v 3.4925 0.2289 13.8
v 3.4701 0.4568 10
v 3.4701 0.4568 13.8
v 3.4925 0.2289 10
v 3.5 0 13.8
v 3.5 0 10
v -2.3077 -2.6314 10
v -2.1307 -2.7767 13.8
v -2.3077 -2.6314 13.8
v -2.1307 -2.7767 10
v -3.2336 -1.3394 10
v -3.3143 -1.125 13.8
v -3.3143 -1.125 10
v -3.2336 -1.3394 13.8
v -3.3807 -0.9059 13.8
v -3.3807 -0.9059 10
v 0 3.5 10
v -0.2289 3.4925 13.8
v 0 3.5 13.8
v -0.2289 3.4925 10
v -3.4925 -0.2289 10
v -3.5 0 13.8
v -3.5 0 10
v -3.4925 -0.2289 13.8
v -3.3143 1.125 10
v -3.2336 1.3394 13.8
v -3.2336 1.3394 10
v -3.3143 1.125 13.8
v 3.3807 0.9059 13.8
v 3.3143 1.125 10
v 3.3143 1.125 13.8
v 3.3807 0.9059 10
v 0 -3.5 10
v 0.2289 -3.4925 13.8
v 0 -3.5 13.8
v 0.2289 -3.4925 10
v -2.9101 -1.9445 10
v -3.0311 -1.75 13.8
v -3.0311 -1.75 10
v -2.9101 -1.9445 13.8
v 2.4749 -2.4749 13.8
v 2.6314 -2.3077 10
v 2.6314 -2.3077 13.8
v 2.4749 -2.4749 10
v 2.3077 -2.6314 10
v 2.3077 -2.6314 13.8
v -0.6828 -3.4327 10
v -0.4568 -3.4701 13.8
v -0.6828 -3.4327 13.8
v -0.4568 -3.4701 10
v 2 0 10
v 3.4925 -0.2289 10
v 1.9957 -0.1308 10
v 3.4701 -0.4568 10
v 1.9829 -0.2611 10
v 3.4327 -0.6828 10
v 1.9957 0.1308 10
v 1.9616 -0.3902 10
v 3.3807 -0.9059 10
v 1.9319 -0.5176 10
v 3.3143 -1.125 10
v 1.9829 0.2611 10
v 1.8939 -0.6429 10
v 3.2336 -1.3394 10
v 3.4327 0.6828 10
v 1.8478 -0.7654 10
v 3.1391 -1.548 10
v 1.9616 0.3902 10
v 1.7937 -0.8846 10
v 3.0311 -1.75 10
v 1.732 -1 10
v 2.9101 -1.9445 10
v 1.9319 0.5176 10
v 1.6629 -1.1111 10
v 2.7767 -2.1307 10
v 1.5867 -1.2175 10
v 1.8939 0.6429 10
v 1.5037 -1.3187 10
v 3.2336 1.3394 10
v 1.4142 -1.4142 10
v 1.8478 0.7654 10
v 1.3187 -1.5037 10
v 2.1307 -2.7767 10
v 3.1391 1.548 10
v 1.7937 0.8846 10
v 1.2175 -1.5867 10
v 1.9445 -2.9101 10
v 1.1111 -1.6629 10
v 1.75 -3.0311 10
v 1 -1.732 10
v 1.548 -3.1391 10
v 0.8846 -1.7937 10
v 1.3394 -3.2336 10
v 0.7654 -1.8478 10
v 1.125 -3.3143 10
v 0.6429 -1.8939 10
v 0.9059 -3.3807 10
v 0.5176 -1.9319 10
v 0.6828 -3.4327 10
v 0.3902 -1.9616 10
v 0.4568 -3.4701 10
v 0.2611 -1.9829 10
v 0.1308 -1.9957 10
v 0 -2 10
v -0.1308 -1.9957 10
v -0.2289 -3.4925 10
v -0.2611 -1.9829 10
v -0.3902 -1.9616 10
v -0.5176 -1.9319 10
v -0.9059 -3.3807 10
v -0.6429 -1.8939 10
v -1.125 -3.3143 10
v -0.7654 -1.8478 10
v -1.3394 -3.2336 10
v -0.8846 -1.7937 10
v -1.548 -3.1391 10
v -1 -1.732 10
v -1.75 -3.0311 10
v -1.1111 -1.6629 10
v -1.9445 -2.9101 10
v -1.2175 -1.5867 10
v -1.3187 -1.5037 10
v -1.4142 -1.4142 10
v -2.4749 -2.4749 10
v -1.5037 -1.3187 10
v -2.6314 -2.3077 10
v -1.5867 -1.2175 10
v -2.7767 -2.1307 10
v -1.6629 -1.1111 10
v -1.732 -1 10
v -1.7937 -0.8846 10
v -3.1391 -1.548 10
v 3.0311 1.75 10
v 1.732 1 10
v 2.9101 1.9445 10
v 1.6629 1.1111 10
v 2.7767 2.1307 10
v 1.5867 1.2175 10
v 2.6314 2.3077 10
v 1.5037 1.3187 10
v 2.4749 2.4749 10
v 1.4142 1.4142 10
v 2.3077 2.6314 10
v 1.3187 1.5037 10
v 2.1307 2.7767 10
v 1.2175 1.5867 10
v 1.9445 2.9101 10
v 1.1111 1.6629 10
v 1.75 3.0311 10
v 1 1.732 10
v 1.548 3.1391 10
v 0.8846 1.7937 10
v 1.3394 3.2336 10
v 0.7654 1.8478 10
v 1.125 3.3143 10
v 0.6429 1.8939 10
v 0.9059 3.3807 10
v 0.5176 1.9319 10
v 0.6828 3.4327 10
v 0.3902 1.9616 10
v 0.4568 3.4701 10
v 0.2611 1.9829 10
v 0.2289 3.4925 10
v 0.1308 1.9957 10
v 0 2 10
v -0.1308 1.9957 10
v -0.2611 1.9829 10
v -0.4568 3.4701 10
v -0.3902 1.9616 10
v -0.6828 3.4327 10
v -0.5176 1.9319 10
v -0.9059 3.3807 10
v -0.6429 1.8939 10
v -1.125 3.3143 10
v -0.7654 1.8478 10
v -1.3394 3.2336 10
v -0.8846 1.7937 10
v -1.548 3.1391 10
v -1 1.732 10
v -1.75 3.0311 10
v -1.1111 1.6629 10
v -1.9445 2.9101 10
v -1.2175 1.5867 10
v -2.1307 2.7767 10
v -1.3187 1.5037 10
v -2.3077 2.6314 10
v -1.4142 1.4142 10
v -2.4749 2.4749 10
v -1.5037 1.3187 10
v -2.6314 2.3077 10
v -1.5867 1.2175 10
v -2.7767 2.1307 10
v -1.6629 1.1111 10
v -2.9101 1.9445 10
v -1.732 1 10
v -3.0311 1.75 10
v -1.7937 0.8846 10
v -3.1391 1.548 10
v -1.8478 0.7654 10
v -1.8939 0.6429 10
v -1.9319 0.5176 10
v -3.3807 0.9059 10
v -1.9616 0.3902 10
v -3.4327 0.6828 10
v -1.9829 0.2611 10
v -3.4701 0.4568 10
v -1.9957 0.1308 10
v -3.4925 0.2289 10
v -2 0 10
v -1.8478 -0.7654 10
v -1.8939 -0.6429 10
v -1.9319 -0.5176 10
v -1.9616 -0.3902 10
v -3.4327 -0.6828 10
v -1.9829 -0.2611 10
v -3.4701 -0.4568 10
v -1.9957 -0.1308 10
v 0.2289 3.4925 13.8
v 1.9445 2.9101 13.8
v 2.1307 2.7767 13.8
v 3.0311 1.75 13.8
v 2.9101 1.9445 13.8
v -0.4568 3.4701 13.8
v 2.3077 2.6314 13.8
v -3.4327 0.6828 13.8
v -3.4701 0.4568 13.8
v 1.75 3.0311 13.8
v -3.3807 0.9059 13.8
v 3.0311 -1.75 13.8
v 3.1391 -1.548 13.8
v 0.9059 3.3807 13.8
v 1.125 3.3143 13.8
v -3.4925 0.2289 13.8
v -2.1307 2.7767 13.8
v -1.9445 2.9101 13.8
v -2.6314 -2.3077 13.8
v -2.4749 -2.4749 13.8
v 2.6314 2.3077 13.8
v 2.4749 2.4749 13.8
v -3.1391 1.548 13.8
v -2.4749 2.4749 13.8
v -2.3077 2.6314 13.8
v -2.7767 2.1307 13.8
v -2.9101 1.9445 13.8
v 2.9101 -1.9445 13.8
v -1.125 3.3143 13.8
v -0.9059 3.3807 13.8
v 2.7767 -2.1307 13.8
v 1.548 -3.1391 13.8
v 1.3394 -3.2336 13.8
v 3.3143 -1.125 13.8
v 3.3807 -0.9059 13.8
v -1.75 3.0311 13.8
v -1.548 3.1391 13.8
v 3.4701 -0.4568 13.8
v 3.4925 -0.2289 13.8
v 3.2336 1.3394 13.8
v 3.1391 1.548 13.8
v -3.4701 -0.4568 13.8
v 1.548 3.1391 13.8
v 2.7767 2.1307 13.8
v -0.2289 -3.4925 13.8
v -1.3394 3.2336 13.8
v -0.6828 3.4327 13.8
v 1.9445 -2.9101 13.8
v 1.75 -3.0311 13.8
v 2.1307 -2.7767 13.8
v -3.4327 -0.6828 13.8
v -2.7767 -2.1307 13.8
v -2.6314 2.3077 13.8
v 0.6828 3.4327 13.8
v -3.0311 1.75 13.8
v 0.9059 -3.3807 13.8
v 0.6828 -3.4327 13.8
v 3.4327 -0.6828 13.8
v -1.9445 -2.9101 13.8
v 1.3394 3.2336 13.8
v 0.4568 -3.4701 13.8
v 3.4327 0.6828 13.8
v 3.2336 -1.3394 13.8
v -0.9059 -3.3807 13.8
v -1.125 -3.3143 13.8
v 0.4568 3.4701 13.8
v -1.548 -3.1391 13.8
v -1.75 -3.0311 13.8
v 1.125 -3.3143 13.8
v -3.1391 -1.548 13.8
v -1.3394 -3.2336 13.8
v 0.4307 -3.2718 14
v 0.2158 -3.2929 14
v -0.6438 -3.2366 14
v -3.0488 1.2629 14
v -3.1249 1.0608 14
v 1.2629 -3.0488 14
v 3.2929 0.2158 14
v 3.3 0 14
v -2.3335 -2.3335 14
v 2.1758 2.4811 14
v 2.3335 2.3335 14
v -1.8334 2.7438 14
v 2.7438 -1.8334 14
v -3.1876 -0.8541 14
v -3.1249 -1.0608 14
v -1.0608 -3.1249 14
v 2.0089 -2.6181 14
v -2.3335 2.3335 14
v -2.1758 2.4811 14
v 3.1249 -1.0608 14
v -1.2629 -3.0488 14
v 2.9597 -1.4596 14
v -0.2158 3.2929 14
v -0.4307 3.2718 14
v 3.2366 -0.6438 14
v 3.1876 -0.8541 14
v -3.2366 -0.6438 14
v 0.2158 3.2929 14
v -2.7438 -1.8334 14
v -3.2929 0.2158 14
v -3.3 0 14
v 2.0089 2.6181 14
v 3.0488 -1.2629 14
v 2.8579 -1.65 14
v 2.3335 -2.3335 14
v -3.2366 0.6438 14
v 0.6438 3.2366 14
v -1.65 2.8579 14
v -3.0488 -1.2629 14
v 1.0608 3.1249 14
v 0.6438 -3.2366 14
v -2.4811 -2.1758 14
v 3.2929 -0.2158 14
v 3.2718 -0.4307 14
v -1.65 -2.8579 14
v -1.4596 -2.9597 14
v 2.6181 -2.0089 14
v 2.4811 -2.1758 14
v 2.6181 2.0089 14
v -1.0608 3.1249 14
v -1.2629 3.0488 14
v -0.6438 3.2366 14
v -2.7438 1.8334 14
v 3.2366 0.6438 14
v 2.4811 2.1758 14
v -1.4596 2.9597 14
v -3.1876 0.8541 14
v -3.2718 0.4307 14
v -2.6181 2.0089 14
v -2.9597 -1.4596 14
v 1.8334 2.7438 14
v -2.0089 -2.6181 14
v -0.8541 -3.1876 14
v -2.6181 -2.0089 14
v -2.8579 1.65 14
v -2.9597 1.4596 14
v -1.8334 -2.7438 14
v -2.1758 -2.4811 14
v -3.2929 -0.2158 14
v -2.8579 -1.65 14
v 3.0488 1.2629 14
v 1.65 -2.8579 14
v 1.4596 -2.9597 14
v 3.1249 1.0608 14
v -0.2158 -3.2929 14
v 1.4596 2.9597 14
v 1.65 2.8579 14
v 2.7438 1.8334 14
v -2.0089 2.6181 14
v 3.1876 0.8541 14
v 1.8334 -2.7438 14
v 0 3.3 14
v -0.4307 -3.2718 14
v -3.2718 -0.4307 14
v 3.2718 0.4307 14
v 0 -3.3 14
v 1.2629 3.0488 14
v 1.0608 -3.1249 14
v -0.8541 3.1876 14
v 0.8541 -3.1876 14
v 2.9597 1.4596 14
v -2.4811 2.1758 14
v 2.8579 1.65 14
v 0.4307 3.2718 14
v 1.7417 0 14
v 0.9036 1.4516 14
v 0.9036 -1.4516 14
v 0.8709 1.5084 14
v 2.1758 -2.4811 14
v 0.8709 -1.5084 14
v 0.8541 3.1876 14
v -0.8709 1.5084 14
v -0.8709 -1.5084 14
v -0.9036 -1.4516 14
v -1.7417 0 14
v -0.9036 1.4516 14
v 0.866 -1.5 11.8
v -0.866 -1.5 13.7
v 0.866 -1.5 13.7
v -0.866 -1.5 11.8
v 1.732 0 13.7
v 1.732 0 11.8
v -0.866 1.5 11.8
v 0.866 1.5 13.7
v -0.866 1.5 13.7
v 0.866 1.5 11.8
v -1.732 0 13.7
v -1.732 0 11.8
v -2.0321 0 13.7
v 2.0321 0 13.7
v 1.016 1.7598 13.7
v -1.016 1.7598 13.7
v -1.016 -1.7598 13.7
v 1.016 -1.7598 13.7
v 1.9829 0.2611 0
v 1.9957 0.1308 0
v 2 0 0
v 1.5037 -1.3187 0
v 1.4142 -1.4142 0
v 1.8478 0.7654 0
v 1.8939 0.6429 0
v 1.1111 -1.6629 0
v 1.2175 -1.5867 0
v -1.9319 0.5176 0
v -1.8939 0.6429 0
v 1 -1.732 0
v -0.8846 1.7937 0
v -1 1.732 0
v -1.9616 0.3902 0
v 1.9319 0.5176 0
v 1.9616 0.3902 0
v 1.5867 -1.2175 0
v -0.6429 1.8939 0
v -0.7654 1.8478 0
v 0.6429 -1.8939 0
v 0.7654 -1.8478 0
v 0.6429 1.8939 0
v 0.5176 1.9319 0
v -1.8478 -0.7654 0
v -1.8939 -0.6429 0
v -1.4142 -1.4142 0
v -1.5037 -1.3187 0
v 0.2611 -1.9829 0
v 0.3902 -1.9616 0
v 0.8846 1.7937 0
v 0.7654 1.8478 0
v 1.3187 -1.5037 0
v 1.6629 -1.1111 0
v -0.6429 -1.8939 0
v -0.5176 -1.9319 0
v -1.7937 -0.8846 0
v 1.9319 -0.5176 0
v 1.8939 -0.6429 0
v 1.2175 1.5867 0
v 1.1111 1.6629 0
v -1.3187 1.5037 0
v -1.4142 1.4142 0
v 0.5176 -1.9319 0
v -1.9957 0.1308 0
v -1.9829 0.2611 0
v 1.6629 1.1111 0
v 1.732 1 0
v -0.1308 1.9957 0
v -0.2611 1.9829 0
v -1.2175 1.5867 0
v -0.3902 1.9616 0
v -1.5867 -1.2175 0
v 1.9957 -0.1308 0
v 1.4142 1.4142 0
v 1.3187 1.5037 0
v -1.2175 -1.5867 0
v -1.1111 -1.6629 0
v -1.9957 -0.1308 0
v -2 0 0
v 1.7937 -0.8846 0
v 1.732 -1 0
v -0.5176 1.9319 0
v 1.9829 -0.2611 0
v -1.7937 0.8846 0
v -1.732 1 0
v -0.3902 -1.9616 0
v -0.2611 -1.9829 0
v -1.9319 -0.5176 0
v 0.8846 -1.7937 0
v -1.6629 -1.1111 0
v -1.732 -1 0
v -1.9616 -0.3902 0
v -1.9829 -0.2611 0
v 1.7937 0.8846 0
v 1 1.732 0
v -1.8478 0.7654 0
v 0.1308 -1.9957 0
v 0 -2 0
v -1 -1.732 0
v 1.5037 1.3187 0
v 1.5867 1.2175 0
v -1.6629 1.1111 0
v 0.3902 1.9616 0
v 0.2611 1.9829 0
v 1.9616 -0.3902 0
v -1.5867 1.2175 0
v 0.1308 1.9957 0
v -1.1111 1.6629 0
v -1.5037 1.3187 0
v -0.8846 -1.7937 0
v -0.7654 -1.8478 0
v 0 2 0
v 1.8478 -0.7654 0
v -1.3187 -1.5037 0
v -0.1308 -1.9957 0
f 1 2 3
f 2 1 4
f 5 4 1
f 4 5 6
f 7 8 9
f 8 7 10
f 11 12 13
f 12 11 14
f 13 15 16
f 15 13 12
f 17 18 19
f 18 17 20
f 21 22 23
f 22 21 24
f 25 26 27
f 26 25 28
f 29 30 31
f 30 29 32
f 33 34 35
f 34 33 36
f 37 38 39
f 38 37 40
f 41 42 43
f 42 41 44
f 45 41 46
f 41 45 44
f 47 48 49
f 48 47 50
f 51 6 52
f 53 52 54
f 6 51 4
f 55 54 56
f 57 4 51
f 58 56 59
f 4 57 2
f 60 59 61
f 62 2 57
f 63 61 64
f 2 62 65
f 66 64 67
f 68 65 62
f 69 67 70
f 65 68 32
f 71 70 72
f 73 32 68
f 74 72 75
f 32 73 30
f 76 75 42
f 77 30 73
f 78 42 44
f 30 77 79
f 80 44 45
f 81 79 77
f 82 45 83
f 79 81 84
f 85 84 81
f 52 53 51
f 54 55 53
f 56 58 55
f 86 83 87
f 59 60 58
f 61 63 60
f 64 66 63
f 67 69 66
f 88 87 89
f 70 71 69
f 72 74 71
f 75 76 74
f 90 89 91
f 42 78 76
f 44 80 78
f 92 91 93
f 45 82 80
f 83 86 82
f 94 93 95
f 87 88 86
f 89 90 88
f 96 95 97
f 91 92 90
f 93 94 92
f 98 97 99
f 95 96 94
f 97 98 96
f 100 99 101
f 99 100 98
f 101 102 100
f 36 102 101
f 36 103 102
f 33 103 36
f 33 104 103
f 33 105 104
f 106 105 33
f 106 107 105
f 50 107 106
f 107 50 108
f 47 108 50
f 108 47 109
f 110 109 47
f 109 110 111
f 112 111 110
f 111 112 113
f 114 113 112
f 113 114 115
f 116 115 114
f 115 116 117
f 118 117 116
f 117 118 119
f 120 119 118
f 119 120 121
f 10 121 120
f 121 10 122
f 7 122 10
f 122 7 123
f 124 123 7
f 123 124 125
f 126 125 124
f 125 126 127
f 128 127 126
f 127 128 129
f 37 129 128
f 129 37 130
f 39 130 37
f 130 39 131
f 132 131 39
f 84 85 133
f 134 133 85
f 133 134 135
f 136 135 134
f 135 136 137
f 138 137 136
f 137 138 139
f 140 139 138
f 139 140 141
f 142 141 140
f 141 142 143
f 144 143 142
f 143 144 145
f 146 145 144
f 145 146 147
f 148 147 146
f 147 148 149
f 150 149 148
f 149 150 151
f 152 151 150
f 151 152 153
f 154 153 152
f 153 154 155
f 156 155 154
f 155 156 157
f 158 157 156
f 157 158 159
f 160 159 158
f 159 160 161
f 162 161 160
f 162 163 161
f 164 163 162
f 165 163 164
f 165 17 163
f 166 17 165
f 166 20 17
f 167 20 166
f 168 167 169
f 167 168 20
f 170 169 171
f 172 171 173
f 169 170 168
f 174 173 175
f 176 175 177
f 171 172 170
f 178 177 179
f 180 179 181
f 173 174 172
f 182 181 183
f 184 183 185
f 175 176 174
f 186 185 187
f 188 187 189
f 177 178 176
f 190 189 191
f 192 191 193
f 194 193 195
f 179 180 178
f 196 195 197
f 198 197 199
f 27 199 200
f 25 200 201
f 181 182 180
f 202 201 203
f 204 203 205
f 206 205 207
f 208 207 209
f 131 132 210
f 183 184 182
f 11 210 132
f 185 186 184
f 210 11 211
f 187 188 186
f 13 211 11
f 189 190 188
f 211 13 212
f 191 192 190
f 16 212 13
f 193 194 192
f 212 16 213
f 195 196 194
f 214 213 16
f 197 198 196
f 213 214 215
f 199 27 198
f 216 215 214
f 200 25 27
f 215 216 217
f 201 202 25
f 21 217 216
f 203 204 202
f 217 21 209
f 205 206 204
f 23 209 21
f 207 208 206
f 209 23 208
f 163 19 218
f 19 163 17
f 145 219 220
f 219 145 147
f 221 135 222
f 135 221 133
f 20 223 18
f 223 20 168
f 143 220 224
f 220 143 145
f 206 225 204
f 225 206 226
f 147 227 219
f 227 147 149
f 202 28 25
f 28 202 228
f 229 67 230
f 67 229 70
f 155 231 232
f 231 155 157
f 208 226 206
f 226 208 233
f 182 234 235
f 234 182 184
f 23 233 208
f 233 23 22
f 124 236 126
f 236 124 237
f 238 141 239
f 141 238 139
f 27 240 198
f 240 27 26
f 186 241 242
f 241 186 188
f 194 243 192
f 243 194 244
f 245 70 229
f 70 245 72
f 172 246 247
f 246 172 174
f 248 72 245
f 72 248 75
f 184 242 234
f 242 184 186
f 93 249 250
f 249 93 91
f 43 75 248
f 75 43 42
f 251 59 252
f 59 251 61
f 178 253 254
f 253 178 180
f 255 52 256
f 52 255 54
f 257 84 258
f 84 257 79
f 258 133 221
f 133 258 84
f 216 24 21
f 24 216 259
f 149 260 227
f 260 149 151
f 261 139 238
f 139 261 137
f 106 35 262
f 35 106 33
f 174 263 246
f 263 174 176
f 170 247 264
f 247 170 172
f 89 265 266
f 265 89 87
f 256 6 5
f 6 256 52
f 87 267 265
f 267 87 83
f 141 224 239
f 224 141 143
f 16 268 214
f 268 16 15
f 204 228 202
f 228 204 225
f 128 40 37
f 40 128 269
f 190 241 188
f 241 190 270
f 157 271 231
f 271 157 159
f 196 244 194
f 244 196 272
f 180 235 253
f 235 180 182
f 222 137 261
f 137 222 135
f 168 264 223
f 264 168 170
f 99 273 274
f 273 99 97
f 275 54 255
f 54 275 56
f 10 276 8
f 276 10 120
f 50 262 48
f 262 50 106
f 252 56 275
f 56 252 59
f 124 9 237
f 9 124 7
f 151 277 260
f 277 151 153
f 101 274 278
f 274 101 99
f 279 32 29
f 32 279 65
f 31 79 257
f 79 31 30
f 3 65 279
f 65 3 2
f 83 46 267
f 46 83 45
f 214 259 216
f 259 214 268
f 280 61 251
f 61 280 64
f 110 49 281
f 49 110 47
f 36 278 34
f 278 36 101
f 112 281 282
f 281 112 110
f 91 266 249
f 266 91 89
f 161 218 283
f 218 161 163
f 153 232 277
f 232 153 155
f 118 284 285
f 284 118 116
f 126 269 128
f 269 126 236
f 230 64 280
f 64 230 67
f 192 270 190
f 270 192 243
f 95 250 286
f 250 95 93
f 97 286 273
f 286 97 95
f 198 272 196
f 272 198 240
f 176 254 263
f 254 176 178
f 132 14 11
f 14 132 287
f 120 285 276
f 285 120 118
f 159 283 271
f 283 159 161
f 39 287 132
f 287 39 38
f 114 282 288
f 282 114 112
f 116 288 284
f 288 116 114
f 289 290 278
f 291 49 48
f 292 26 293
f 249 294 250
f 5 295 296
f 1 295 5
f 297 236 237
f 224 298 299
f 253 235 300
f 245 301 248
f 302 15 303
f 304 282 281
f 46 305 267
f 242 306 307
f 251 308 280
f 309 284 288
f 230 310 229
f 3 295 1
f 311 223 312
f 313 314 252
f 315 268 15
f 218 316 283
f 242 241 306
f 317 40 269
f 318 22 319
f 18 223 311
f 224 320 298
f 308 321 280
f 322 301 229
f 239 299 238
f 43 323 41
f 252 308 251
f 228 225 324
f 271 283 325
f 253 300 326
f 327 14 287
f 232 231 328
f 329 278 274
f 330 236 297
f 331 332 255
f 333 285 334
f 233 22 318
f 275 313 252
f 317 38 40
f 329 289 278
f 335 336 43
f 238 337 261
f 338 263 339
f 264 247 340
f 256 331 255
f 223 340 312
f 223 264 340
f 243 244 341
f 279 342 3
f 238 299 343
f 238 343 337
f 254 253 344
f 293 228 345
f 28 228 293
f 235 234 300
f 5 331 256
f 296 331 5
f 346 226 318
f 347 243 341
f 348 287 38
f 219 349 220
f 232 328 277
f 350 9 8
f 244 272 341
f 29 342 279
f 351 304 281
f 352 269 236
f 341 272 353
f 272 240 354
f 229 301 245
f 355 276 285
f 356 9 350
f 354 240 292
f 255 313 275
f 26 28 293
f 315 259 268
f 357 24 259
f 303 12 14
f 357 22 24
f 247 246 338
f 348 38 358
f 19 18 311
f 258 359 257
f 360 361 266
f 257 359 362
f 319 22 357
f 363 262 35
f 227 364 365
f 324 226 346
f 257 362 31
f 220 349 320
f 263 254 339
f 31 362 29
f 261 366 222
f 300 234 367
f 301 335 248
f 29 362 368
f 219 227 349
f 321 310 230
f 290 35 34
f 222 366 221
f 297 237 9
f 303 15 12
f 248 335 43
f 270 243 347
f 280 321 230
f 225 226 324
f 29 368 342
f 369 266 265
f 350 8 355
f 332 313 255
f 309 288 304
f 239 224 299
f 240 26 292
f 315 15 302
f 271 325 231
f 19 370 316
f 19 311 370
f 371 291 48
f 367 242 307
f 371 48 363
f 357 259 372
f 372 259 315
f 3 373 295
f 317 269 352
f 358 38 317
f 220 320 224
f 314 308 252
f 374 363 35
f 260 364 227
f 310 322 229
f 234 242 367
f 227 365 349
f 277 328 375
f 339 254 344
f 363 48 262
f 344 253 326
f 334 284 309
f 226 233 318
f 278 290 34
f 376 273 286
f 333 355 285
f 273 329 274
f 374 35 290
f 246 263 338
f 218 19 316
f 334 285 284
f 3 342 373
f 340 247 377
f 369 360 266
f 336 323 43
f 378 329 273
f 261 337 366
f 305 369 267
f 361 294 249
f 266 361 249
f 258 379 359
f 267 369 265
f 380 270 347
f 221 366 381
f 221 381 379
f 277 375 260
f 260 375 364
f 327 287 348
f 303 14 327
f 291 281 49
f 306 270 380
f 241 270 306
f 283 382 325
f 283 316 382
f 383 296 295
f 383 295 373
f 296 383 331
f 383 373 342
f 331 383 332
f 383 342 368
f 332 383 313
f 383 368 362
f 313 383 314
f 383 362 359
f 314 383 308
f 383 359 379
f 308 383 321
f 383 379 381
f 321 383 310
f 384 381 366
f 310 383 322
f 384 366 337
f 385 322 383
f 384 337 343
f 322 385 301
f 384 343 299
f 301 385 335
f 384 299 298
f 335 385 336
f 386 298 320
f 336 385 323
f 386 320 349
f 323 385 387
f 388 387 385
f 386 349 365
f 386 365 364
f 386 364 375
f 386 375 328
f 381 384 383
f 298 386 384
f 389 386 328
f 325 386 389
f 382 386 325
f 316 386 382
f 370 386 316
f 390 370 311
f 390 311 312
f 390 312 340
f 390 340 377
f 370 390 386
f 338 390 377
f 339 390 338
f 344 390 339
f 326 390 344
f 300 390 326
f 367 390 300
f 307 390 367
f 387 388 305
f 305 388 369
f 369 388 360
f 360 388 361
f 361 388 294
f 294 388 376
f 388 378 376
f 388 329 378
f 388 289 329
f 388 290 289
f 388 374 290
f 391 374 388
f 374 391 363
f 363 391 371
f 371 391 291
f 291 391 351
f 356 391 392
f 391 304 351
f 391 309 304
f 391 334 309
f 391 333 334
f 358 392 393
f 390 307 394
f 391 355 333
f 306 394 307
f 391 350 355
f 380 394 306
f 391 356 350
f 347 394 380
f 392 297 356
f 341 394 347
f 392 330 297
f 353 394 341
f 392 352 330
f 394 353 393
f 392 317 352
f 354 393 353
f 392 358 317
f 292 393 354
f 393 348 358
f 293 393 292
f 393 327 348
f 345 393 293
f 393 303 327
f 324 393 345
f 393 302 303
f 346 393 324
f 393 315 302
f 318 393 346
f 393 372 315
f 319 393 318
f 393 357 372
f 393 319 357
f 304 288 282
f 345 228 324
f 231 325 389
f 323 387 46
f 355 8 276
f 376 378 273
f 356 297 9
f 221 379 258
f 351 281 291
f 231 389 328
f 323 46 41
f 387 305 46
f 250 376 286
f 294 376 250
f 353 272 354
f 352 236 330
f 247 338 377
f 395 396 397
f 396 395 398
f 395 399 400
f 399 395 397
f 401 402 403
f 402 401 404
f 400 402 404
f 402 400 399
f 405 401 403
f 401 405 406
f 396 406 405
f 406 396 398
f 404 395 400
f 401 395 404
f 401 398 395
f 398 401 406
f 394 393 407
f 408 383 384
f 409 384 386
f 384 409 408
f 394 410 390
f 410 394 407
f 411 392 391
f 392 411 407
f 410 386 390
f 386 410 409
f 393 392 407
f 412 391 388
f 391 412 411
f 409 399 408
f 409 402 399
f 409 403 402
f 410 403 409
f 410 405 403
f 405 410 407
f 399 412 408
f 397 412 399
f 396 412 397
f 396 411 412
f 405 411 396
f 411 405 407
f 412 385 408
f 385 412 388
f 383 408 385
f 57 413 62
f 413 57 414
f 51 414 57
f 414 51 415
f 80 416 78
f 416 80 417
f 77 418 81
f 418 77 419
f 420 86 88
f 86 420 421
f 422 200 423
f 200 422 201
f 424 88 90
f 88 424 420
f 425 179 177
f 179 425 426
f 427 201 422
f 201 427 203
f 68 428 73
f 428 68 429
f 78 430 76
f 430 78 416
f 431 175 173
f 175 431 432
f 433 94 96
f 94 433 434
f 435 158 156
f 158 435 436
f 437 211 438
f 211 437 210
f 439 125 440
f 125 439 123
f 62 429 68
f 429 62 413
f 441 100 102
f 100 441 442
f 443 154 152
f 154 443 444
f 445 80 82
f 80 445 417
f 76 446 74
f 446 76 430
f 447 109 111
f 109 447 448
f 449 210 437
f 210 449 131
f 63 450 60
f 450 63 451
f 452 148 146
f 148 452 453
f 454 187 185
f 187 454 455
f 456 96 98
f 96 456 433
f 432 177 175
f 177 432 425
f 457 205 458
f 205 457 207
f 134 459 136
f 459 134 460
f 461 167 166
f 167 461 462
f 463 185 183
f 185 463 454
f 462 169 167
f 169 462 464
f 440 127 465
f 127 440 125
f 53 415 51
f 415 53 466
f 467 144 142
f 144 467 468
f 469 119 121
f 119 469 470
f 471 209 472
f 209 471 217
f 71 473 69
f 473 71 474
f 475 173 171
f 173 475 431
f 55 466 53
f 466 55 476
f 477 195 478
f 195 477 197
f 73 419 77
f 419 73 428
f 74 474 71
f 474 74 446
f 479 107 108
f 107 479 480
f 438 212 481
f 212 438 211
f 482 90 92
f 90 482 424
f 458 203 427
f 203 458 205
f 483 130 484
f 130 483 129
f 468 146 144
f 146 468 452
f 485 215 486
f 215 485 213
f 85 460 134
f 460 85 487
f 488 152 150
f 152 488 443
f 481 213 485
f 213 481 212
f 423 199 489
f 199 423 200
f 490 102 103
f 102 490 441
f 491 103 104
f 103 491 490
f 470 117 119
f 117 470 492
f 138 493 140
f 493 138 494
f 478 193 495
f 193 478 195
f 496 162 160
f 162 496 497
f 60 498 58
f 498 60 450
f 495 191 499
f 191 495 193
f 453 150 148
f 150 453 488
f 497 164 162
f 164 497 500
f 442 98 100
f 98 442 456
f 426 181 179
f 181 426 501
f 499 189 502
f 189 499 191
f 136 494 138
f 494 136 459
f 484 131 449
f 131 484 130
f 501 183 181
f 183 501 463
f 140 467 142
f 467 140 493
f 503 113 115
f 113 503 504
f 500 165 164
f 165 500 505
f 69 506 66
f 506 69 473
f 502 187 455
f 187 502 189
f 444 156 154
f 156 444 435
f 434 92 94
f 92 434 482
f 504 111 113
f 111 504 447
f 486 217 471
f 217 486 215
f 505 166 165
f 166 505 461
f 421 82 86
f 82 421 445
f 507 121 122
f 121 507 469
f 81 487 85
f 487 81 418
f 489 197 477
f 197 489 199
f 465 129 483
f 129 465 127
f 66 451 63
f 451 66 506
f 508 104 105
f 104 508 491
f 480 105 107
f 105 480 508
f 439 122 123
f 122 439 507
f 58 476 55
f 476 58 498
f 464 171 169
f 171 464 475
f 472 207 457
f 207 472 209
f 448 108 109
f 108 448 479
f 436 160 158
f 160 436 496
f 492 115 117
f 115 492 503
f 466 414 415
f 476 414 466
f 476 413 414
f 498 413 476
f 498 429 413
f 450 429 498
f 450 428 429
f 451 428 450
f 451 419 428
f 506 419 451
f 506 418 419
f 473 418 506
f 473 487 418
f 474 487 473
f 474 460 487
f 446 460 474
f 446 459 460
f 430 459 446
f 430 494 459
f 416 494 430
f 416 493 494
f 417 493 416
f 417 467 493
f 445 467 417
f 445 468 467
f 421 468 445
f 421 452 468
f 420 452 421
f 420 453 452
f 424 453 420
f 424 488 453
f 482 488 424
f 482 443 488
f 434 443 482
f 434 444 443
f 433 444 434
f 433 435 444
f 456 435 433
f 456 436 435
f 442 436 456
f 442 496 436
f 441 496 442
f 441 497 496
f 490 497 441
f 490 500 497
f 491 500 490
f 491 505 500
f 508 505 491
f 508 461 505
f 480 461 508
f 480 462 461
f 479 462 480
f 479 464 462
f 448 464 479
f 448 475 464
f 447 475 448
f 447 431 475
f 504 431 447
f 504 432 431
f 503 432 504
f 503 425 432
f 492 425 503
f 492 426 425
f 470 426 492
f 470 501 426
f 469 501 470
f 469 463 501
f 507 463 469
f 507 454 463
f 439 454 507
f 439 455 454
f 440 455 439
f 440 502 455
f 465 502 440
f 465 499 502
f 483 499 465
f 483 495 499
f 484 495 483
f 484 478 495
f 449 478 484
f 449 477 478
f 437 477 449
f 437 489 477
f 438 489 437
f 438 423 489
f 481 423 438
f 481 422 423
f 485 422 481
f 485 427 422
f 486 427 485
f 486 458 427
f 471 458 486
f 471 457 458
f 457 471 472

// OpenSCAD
$fn=96;

// Socket Head Cap Screw (approx. ISO 4762)
// Parameters from prompt:
d_shank = 4.0;      // mm (nominal thread/shank diameter)
L = 10.0;           // mm (under-head length)
d_head = 7.0;       // mm
h_head = 4.0;       // mm

// Typical socket dimensions for M4 SHCS (approx):
socket_af = 3.0;    // mm hex key size
socket_depth = 2.2; // mm
socket_chamfer = 0.3;

// Simple thread approximation (smooth cylinder)
module shank(d, len){
    cylinder(d=d, h=len);
}

module head(d, h){
    // slight top edge chamfer
    difference(){
        union(){
            cylinder(d=d, h=h - 0.2);
            translate([0,0,h - 0.2])
                cylinder(d1=d, d2=d - 0.4, h=0.2);
        }
        // hex socket
        translate([0,0,h - socket_depth])
            cylinder(d=socket_af / cos(30), h=socket_depth + 0.01, $fn=6);
        // small chamfer at socket opening
        translate([0,0,h - socket_chamfer])
            cylinder(d1=(socket_af / cos(30)) + 0.6, d2=(socket_af / cos(30)), h=socket_chamfer + 0.01, $fn=6);
    }
}

module socket_head_cap_screw(){
    union(){
        // shank under head
        shank(d_shank, L);
        // head on top of shank
        translate([0,0,L])
            head(d_head, h_head);
    }
}

socket_head_cap_screw();
